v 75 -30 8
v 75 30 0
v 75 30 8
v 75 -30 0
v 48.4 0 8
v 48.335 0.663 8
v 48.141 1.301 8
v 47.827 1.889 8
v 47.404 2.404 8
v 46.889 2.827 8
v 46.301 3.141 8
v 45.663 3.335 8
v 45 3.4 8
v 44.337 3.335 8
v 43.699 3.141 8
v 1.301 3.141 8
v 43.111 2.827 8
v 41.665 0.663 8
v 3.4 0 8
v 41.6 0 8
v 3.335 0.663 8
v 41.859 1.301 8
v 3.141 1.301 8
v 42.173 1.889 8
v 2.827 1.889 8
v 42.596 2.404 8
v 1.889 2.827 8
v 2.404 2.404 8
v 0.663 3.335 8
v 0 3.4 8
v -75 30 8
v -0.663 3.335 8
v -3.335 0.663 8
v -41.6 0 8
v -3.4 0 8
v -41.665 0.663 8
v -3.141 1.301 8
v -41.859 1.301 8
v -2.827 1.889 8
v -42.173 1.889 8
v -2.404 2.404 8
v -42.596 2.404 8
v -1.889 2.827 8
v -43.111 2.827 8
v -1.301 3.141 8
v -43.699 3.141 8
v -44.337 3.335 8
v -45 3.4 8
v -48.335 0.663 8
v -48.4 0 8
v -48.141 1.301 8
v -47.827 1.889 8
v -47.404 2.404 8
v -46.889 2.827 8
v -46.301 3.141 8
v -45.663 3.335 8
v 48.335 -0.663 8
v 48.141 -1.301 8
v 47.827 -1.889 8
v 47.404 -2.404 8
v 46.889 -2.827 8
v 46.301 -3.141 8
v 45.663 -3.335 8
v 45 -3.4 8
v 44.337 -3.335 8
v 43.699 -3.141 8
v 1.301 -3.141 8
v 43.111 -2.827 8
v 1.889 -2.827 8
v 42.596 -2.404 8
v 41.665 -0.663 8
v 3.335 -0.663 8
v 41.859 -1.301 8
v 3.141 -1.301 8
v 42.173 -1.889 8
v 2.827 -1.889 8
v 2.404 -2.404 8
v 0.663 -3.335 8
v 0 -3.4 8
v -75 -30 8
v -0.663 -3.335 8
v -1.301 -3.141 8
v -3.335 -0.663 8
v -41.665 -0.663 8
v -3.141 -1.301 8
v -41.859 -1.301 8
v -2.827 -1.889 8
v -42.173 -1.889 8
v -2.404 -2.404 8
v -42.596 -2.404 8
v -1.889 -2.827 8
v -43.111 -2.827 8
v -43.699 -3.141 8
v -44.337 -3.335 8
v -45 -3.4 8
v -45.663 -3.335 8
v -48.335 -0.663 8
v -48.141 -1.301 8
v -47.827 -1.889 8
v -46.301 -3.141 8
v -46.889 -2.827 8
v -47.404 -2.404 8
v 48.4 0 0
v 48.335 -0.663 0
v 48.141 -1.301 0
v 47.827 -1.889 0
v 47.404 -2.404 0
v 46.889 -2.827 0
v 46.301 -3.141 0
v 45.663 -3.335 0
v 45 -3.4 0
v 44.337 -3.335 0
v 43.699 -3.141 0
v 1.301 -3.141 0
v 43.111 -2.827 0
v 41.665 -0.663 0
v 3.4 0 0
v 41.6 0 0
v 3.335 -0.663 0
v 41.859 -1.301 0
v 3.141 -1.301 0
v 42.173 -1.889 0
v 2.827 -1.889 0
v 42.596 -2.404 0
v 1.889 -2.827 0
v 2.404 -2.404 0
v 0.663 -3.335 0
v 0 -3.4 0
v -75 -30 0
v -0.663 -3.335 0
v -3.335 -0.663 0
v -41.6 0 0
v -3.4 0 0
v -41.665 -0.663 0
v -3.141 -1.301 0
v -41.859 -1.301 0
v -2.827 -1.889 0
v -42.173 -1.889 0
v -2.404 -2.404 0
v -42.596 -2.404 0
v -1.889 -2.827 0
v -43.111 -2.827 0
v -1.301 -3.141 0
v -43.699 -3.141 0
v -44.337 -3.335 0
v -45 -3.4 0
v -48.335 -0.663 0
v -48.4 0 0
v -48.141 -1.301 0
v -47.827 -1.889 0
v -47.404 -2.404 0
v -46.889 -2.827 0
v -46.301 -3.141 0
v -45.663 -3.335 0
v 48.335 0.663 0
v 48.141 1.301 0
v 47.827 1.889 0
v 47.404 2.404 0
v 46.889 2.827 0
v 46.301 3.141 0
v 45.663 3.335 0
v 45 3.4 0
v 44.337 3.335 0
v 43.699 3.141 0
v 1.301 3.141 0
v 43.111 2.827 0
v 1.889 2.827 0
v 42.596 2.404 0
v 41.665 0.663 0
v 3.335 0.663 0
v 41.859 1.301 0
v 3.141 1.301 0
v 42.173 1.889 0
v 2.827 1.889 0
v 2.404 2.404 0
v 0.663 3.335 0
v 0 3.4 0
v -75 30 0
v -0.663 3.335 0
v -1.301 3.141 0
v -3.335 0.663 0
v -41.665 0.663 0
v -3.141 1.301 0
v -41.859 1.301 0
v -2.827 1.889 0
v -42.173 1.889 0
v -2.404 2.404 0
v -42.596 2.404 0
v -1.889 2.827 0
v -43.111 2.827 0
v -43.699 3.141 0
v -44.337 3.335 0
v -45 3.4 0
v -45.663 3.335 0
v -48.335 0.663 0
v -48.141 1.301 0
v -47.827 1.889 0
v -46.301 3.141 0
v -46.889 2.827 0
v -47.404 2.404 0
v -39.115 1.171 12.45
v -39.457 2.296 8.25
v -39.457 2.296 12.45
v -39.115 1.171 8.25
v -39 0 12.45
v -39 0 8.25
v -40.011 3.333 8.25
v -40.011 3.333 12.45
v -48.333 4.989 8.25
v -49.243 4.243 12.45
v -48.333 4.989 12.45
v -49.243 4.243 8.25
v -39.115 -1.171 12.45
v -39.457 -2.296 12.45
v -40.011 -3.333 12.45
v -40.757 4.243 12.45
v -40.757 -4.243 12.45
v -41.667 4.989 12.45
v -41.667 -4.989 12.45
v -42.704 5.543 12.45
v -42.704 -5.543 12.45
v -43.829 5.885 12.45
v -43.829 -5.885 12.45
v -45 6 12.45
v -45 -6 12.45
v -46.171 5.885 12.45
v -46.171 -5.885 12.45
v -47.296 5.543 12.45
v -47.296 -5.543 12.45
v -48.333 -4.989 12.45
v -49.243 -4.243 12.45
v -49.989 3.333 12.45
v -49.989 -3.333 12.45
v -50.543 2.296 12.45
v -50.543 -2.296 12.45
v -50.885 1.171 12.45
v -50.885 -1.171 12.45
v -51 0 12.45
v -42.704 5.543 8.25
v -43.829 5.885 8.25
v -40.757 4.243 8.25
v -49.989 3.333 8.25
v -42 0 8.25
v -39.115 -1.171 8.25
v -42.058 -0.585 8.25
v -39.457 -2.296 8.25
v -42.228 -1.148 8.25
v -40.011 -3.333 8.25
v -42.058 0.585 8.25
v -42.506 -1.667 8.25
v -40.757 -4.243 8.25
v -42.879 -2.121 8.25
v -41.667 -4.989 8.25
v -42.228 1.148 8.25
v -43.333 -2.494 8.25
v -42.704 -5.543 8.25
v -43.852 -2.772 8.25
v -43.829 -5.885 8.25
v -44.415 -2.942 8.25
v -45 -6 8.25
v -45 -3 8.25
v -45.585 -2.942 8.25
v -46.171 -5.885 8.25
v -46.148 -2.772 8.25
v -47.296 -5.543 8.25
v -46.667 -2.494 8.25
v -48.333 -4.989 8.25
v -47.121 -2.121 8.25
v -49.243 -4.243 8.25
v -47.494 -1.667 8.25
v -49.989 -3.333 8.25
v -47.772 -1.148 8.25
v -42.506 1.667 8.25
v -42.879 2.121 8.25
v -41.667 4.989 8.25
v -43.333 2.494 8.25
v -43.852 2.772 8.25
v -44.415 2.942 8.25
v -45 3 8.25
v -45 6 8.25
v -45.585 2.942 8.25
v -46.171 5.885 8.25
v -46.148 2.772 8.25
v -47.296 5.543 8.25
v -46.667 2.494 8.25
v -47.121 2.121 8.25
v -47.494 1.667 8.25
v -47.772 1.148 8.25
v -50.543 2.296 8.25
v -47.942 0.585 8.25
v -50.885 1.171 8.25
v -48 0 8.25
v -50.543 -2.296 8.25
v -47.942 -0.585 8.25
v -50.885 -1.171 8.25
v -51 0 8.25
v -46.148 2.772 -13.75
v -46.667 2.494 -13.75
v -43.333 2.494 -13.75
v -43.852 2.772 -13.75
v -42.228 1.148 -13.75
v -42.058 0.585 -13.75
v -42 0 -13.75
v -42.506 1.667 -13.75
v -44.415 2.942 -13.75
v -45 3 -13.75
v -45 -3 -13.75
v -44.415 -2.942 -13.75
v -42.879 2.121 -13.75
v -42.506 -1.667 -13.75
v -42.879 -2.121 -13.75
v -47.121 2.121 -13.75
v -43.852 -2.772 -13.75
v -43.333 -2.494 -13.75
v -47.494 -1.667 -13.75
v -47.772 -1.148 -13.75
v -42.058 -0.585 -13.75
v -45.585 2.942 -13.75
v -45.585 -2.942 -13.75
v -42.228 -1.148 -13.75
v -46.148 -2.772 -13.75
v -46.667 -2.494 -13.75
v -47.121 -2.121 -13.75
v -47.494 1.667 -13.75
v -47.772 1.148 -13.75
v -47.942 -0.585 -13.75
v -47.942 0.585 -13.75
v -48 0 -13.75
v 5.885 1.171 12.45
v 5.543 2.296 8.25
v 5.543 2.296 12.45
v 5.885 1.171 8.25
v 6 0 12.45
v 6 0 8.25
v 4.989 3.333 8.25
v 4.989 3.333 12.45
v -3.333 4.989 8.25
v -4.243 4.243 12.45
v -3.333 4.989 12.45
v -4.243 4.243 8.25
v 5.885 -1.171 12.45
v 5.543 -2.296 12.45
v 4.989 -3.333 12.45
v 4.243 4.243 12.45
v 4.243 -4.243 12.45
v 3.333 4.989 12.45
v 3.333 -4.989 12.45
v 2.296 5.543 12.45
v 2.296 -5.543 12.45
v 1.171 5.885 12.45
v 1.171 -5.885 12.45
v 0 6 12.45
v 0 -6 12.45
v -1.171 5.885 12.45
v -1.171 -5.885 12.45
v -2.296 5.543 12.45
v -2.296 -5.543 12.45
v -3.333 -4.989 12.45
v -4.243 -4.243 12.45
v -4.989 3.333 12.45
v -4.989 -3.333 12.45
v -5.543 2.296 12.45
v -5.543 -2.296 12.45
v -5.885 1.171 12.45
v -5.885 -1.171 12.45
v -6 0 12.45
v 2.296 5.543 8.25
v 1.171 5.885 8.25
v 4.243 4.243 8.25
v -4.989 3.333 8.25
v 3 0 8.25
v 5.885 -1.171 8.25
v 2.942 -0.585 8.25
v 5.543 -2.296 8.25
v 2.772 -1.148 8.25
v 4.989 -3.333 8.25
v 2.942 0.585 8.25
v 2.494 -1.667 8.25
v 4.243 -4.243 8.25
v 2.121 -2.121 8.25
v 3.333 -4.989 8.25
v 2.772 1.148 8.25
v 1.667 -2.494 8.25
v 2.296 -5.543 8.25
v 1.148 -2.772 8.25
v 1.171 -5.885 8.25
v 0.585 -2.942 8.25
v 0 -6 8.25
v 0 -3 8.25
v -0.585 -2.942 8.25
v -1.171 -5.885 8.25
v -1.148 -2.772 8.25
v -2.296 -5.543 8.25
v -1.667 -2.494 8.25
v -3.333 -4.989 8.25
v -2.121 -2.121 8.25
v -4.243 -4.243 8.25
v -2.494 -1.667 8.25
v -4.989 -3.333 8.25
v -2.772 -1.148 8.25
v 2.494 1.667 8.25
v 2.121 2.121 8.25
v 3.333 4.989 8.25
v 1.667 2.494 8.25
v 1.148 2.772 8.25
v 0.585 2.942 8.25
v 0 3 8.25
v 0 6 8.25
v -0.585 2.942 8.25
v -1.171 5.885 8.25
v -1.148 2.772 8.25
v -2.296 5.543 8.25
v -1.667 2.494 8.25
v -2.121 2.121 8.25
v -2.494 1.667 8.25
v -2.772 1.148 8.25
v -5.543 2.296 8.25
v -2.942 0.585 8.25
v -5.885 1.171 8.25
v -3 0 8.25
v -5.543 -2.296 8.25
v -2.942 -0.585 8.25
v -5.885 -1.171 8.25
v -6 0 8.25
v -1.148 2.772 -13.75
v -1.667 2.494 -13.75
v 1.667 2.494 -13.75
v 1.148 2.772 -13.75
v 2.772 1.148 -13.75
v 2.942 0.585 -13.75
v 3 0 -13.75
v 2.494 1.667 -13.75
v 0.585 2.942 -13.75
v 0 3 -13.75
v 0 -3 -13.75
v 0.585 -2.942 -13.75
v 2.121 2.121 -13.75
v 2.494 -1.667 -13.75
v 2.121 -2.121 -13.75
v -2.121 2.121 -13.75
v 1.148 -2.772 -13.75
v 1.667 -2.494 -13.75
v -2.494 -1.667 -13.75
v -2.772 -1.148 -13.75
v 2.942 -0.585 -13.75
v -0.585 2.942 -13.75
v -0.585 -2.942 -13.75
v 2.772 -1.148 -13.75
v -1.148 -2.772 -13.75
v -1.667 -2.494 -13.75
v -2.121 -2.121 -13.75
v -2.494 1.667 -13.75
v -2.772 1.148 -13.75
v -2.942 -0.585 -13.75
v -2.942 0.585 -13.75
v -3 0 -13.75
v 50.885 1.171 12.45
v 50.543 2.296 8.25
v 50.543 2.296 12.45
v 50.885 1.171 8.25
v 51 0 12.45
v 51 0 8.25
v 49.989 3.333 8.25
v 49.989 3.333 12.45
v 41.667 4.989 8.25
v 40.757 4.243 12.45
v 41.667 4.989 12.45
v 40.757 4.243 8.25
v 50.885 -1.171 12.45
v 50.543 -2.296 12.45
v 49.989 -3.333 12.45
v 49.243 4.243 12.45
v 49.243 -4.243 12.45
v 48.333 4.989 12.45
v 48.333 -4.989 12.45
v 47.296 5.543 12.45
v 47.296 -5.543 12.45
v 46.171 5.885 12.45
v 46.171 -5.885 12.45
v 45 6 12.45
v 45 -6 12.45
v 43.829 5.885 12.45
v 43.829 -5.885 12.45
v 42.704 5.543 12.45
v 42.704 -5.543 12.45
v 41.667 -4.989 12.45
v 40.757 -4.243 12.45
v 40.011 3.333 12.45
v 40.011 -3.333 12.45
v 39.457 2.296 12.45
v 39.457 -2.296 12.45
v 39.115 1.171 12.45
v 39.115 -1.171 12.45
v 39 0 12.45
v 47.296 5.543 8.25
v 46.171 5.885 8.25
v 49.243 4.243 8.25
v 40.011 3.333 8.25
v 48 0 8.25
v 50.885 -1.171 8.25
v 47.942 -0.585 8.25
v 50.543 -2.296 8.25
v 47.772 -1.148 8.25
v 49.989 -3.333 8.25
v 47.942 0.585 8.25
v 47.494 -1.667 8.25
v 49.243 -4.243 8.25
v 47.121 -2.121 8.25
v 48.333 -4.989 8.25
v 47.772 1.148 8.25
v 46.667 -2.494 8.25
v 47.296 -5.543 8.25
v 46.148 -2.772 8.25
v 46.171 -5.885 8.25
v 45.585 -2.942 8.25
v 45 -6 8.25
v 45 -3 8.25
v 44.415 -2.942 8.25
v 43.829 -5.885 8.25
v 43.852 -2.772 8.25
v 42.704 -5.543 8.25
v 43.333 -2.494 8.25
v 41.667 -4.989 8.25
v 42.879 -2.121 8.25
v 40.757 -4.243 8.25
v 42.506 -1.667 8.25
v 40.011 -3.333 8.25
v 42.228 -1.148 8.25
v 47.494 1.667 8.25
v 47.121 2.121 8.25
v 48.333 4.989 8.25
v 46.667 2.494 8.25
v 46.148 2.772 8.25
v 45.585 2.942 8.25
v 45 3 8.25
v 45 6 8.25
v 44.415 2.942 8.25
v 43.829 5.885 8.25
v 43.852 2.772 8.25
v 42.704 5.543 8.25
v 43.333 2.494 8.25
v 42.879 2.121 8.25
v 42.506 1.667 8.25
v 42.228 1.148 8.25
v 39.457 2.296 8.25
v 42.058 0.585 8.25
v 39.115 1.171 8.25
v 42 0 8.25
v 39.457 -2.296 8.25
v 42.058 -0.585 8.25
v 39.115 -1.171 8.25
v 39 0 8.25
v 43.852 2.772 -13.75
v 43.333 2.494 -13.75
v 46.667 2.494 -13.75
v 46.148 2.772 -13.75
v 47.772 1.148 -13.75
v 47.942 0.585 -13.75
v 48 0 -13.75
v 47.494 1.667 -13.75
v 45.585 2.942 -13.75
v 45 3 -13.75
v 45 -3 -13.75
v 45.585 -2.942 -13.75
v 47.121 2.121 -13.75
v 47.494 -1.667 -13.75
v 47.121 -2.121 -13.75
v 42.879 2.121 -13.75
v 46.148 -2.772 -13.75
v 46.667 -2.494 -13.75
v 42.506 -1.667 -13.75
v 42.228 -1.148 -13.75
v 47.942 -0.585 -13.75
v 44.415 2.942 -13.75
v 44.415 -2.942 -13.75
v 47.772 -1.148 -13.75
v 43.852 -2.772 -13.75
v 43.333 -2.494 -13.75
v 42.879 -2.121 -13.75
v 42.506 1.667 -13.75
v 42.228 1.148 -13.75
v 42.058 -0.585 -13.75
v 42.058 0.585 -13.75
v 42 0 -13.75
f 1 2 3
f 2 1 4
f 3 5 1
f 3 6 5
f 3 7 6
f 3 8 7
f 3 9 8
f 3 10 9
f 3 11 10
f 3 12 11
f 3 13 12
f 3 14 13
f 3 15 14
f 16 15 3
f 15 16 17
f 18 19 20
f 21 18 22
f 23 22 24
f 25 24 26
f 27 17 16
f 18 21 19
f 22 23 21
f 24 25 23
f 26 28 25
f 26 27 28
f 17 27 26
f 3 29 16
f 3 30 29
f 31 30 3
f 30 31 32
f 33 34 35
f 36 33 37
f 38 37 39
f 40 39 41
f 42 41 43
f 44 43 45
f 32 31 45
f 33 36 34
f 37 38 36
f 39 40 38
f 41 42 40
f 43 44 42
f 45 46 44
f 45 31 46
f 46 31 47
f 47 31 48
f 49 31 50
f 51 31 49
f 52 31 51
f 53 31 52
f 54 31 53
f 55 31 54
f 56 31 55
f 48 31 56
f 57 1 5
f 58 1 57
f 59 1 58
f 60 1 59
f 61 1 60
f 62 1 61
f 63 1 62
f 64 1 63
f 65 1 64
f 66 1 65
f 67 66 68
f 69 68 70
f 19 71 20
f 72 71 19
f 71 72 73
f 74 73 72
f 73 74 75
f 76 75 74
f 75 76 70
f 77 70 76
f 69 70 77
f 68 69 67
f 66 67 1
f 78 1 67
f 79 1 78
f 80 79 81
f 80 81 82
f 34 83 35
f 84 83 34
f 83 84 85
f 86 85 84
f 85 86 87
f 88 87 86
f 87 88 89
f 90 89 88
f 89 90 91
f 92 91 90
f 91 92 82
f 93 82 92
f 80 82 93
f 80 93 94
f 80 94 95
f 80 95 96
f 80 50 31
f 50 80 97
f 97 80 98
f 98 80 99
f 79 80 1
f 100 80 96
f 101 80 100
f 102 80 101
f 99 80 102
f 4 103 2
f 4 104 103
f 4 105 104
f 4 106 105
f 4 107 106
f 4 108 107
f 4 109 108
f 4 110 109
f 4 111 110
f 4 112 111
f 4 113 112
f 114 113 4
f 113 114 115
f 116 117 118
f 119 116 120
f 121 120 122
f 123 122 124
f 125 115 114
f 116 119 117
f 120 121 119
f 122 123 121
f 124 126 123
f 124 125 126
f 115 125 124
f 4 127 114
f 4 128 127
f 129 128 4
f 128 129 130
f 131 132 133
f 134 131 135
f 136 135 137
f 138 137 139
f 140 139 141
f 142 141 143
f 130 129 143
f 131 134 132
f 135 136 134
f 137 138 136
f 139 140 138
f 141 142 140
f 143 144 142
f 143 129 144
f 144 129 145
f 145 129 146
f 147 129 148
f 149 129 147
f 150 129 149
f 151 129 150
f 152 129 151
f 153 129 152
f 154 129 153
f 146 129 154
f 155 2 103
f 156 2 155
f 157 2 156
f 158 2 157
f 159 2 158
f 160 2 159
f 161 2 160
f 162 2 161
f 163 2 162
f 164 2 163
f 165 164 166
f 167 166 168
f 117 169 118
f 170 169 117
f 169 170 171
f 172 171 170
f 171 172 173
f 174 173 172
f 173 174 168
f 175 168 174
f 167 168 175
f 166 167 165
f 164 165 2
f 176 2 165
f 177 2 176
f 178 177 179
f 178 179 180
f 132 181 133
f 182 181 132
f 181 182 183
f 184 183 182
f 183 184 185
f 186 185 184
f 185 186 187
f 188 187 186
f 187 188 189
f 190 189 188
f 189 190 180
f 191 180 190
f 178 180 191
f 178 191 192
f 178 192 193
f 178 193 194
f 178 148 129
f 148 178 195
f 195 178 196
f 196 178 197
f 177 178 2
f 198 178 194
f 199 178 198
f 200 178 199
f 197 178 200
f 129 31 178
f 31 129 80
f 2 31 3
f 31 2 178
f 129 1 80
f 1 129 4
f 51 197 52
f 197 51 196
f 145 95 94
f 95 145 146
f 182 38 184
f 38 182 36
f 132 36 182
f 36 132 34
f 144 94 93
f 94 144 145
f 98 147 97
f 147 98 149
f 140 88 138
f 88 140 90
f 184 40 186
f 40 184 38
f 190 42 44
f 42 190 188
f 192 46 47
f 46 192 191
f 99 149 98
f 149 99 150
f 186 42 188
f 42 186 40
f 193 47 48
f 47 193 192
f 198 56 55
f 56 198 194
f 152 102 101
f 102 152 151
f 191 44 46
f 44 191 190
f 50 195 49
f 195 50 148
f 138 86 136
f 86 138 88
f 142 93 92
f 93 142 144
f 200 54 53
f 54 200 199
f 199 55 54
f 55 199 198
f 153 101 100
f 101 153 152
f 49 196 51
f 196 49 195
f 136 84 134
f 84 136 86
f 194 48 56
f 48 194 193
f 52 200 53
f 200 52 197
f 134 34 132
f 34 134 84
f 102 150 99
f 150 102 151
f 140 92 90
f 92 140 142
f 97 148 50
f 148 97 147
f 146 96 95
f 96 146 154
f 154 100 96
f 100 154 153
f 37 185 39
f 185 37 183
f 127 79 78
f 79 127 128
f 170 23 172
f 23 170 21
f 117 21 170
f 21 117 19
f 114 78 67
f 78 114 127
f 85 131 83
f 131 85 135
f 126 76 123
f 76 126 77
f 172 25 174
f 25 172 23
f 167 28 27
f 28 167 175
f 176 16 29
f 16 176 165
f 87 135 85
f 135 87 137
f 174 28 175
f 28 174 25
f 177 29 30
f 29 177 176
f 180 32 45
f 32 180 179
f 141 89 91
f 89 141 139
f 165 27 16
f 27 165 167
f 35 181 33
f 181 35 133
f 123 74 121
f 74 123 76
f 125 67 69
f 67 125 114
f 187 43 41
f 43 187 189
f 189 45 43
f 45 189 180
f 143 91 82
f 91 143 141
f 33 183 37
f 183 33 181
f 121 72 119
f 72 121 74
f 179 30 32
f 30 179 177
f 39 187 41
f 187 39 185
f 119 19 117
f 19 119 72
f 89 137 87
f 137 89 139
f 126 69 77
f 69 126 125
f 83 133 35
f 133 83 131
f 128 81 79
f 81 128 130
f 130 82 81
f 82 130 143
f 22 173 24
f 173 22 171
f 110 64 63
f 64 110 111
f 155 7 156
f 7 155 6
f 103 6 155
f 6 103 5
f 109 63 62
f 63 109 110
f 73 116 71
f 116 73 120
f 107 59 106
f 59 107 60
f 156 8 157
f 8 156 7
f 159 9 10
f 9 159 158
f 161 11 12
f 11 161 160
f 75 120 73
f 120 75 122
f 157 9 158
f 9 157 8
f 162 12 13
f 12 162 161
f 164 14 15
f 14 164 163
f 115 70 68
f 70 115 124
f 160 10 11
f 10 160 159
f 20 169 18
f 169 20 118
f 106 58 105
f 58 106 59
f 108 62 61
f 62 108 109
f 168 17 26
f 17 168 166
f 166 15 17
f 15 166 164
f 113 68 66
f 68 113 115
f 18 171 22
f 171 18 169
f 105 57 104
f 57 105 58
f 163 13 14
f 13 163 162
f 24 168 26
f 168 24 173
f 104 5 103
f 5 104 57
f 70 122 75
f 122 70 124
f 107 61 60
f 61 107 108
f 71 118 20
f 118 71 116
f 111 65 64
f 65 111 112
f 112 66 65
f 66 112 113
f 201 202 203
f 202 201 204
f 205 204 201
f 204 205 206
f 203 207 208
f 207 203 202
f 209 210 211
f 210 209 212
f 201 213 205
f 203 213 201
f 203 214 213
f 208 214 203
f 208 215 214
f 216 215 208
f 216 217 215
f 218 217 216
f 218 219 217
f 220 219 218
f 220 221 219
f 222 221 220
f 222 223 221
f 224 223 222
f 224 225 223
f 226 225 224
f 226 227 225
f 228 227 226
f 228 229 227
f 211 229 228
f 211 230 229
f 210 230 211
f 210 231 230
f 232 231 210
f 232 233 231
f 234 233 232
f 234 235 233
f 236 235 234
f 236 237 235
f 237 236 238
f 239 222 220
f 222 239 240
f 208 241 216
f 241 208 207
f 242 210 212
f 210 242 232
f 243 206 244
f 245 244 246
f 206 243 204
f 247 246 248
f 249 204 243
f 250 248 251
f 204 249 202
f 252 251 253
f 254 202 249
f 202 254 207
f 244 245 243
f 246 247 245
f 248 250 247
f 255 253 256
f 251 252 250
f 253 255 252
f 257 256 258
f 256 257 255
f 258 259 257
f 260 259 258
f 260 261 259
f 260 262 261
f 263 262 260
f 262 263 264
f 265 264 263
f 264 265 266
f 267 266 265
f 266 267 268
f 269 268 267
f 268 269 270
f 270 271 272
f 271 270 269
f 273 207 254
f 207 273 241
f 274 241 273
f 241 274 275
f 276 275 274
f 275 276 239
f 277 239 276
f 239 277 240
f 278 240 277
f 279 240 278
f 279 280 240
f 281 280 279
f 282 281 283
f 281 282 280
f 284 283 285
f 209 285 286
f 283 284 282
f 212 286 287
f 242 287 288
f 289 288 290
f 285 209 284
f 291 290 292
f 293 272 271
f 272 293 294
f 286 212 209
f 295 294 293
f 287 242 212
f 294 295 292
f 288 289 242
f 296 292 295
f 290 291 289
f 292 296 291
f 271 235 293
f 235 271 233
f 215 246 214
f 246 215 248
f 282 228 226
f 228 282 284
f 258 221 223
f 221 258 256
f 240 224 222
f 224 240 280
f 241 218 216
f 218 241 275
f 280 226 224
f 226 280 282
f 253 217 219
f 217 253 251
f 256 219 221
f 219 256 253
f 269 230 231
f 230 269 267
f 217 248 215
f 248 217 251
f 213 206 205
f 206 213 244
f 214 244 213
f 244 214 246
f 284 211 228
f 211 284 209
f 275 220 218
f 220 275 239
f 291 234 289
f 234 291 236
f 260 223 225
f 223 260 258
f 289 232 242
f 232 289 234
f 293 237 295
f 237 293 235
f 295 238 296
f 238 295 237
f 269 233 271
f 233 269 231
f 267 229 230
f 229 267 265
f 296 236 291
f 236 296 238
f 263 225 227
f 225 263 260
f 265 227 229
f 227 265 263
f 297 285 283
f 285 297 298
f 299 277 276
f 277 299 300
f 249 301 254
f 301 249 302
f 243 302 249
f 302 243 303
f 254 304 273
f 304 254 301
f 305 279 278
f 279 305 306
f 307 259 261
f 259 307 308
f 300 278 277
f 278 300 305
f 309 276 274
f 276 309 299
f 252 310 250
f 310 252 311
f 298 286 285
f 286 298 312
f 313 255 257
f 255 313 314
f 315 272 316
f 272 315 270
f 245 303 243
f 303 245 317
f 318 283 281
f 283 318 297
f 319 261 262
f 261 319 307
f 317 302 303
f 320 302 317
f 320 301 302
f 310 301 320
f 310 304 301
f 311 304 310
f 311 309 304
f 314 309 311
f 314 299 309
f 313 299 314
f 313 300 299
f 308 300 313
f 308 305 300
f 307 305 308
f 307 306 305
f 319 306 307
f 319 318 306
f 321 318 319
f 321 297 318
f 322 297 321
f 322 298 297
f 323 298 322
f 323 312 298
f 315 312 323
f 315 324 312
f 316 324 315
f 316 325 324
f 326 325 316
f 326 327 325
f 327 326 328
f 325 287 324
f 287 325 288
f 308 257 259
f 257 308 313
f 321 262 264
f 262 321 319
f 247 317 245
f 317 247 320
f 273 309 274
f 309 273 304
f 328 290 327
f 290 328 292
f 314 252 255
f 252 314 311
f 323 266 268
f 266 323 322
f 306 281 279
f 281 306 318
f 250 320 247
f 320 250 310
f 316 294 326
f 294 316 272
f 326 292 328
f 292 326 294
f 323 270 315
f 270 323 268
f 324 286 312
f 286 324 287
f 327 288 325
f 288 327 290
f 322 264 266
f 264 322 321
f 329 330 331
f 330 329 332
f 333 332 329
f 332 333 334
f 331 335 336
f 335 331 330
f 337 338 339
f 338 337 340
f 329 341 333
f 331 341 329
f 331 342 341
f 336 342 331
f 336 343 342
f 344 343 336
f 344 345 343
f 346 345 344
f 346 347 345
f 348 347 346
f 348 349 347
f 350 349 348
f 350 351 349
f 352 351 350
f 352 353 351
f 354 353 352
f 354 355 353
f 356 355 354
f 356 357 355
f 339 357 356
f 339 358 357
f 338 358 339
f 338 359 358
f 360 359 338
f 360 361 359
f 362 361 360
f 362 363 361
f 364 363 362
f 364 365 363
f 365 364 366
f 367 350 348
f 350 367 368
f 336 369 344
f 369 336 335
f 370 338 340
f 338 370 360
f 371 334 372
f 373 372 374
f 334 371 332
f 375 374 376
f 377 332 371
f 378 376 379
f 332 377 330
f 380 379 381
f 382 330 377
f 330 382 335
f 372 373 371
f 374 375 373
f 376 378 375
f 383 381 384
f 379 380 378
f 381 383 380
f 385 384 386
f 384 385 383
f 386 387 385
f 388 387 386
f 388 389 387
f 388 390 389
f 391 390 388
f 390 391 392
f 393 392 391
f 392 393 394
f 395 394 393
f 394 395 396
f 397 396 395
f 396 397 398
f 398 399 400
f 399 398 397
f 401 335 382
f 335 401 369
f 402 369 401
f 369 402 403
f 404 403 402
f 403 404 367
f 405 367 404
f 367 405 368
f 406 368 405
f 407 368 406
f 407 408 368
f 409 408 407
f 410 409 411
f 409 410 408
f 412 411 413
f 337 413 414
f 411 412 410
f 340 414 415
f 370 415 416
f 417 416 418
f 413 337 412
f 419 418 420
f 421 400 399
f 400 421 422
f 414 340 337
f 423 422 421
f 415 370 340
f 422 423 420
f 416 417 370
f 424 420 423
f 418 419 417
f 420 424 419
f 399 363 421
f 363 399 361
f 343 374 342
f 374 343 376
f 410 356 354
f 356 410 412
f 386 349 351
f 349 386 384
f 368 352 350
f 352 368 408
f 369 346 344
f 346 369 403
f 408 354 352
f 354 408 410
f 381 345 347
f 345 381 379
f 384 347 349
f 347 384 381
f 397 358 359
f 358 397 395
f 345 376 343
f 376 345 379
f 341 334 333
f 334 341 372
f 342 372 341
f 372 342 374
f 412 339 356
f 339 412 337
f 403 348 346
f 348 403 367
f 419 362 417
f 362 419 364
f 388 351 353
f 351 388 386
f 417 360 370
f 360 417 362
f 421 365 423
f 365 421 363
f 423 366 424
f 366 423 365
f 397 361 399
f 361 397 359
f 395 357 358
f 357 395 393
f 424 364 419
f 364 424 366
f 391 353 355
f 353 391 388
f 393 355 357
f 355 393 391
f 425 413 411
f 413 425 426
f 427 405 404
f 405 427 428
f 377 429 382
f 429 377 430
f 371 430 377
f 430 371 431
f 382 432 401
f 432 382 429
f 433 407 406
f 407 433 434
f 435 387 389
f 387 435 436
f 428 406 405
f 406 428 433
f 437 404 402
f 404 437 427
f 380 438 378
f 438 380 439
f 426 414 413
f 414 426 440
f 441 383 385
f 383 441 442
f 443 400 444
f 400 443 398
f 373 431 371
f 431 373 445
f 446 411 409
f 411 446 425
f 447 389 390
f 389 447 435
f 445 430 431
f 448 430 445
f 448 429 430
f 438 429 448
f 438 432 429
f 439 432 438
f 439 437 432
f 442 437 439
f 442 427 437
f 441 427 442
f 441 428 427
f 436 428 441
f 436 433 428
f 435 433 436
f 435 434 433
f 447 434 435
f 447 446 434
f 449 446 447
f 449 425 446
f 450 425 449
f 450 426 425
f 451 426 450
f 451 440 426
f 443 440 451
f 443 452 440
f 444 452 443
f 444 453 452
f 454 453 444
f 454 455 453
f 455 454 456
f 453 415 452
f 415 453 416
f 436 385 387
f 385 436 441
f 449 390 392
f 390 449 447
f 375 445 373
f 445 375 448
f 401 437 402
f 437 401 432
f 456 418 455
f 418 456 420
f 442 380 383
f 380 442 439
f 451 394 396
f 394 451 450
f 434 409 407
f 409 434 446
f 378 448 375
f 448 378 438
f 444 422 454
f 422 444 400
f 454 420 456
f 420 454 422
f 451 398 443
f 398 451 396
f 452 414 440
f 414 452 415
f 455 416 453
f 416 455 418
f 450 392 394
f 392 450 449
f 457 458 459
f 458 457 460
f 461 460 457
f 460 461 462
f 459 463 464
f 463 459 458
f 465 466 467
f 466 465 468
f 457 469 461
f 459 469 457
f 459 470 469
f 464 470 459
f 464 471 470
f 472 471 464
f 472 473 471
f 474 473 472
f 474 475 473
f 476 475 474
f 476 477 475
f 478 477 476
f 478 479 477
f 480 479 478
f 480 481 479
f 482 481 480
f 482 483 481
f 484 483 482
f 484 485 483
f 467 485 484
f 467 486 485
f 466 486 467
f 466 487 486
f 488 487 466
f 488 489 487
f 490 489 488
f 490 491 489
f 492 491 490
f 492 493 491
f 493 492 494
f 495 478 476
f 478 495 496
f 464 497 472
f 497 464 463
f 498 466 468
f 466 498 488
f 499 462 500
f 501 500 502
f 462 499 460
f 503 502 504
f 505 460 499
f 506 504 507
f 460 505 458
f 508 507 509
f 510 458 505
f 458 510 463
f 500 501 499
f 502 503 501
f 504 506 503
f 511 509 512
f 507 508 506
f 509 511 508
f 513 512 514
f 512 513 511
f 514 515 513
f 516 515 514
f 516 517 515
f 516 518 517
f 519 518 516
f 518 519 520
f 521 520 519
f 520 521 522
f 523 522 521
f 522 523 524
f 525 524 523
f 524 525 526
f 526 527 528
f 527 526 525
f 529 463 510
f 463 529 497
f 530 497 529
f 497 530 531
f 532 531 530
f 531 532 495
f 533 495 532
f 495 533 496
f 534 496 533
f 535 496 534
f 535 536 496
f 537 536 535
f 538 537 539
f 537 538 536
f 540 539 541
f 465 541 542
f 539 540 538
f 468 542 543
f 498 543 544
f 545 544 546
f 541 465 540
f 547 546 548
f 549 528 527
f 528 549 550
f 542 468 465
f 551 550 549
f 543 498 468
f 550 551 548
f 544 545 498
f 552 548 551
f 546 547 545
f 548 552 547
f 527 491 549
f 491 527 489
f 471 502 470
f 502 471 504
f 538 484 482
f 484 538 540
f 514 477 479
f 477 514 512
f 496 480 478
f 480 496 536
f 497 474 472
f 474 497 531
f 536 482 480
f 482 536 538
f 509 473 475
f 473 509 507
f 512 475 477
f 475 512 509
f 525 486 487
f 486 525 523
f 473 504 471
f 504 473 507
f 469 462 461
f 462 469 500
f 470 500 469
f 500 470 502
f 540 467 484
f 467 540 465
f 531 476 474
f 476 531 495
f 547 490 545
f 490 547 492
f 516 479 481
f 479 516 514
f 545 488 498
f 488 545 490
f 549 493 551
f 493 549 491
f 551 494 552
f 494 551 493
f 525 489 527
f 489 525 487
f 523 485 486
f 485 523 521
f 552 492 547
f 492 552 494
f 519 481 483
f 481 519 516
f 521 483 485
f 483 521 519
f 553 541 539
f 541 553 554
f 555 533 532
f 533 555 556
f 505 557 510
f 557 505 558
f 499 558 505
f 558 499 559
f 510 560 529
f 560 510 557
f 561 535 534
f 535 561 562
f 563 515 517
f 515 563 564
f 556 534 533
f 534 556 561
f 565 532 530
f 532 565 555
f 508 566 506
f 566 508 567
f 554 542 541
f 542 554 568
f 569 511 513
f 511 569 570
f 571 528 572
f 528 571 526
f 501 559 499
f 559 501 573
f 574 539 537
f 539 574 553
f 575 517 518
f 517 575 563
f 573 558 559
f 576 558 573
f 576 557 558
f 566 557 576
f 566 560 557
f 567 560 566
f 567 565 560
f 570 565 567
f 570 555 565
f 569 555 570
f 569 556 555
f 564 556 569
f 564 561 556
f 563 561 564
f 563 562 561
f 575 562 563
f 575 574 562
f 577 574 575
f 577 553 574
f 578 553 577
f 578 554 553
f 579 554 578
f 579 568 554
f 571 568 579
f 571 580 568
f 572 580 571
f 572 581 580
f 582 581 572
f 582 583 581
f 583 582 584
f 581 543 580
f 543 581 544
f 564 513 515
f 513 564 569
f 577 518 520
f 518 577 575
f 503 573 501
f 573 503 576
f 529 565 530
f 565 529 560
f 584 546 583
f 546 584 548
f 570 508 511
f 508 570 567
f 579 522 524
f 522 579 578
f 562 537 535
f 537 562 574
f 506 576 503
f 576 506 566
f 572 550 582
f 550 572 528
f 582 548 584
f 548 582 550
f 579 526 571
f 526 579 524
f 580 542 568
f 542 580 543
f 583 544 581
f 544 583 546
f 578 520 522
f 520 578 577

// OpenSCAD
$fn = 32;

// ------------------------------------------------------------------------
// Bolted plate: 150 x 60 x 8 mm plate, 3 fasteners
// Every part is its own module, assembly() places them once.
// ------------------------------------------------------------------------

// --- part 1 ---
module plate() {
  difference() {
    translate([-75, -30, 0]) cube([150, 60, 8]);
    translate([-45, 0, -1]) cylinder(h = 10, d = 6.8);
    translate([0, 0, -1]) cylinder(h = 10, d = 6.8);
    translate([45, 0, -1]) cylinder(h = 10, d = 6.8);
  }
}

// --- part 2 ---
module bolt1() {
  cylinder(h = 4.2, d = 12);
  translate([0, 0, -22]) cylinder(h = 22, d = 6);
}

// --- part 3 ---
module bolt2() {
  cylinder(h = 4.2, d = 12);
  translate([0, 0, -22]) cylinder(h = 22, d = 6);
}

// --- part 4 ---
module bolt3() {
  cylinder(h = 4.2, d = 12);
  translate([0, 0, -22]) cylinder(h = 22, d = 6);
}

// --- assembly ---
module assembly() {
  translate([0, 0, 0]) rotate([0, 0, 0]) plate();
  translate([-45, 0, 8.25]) rotate([0, 0, 0]) bolt1();
  translate([0, 0, 8.25]) rotate([0, 0, 0]) bolt2();
  translate([45, 0, 8.25]) rotate([0, 0, 0]) bolt3();
}

assembly();
